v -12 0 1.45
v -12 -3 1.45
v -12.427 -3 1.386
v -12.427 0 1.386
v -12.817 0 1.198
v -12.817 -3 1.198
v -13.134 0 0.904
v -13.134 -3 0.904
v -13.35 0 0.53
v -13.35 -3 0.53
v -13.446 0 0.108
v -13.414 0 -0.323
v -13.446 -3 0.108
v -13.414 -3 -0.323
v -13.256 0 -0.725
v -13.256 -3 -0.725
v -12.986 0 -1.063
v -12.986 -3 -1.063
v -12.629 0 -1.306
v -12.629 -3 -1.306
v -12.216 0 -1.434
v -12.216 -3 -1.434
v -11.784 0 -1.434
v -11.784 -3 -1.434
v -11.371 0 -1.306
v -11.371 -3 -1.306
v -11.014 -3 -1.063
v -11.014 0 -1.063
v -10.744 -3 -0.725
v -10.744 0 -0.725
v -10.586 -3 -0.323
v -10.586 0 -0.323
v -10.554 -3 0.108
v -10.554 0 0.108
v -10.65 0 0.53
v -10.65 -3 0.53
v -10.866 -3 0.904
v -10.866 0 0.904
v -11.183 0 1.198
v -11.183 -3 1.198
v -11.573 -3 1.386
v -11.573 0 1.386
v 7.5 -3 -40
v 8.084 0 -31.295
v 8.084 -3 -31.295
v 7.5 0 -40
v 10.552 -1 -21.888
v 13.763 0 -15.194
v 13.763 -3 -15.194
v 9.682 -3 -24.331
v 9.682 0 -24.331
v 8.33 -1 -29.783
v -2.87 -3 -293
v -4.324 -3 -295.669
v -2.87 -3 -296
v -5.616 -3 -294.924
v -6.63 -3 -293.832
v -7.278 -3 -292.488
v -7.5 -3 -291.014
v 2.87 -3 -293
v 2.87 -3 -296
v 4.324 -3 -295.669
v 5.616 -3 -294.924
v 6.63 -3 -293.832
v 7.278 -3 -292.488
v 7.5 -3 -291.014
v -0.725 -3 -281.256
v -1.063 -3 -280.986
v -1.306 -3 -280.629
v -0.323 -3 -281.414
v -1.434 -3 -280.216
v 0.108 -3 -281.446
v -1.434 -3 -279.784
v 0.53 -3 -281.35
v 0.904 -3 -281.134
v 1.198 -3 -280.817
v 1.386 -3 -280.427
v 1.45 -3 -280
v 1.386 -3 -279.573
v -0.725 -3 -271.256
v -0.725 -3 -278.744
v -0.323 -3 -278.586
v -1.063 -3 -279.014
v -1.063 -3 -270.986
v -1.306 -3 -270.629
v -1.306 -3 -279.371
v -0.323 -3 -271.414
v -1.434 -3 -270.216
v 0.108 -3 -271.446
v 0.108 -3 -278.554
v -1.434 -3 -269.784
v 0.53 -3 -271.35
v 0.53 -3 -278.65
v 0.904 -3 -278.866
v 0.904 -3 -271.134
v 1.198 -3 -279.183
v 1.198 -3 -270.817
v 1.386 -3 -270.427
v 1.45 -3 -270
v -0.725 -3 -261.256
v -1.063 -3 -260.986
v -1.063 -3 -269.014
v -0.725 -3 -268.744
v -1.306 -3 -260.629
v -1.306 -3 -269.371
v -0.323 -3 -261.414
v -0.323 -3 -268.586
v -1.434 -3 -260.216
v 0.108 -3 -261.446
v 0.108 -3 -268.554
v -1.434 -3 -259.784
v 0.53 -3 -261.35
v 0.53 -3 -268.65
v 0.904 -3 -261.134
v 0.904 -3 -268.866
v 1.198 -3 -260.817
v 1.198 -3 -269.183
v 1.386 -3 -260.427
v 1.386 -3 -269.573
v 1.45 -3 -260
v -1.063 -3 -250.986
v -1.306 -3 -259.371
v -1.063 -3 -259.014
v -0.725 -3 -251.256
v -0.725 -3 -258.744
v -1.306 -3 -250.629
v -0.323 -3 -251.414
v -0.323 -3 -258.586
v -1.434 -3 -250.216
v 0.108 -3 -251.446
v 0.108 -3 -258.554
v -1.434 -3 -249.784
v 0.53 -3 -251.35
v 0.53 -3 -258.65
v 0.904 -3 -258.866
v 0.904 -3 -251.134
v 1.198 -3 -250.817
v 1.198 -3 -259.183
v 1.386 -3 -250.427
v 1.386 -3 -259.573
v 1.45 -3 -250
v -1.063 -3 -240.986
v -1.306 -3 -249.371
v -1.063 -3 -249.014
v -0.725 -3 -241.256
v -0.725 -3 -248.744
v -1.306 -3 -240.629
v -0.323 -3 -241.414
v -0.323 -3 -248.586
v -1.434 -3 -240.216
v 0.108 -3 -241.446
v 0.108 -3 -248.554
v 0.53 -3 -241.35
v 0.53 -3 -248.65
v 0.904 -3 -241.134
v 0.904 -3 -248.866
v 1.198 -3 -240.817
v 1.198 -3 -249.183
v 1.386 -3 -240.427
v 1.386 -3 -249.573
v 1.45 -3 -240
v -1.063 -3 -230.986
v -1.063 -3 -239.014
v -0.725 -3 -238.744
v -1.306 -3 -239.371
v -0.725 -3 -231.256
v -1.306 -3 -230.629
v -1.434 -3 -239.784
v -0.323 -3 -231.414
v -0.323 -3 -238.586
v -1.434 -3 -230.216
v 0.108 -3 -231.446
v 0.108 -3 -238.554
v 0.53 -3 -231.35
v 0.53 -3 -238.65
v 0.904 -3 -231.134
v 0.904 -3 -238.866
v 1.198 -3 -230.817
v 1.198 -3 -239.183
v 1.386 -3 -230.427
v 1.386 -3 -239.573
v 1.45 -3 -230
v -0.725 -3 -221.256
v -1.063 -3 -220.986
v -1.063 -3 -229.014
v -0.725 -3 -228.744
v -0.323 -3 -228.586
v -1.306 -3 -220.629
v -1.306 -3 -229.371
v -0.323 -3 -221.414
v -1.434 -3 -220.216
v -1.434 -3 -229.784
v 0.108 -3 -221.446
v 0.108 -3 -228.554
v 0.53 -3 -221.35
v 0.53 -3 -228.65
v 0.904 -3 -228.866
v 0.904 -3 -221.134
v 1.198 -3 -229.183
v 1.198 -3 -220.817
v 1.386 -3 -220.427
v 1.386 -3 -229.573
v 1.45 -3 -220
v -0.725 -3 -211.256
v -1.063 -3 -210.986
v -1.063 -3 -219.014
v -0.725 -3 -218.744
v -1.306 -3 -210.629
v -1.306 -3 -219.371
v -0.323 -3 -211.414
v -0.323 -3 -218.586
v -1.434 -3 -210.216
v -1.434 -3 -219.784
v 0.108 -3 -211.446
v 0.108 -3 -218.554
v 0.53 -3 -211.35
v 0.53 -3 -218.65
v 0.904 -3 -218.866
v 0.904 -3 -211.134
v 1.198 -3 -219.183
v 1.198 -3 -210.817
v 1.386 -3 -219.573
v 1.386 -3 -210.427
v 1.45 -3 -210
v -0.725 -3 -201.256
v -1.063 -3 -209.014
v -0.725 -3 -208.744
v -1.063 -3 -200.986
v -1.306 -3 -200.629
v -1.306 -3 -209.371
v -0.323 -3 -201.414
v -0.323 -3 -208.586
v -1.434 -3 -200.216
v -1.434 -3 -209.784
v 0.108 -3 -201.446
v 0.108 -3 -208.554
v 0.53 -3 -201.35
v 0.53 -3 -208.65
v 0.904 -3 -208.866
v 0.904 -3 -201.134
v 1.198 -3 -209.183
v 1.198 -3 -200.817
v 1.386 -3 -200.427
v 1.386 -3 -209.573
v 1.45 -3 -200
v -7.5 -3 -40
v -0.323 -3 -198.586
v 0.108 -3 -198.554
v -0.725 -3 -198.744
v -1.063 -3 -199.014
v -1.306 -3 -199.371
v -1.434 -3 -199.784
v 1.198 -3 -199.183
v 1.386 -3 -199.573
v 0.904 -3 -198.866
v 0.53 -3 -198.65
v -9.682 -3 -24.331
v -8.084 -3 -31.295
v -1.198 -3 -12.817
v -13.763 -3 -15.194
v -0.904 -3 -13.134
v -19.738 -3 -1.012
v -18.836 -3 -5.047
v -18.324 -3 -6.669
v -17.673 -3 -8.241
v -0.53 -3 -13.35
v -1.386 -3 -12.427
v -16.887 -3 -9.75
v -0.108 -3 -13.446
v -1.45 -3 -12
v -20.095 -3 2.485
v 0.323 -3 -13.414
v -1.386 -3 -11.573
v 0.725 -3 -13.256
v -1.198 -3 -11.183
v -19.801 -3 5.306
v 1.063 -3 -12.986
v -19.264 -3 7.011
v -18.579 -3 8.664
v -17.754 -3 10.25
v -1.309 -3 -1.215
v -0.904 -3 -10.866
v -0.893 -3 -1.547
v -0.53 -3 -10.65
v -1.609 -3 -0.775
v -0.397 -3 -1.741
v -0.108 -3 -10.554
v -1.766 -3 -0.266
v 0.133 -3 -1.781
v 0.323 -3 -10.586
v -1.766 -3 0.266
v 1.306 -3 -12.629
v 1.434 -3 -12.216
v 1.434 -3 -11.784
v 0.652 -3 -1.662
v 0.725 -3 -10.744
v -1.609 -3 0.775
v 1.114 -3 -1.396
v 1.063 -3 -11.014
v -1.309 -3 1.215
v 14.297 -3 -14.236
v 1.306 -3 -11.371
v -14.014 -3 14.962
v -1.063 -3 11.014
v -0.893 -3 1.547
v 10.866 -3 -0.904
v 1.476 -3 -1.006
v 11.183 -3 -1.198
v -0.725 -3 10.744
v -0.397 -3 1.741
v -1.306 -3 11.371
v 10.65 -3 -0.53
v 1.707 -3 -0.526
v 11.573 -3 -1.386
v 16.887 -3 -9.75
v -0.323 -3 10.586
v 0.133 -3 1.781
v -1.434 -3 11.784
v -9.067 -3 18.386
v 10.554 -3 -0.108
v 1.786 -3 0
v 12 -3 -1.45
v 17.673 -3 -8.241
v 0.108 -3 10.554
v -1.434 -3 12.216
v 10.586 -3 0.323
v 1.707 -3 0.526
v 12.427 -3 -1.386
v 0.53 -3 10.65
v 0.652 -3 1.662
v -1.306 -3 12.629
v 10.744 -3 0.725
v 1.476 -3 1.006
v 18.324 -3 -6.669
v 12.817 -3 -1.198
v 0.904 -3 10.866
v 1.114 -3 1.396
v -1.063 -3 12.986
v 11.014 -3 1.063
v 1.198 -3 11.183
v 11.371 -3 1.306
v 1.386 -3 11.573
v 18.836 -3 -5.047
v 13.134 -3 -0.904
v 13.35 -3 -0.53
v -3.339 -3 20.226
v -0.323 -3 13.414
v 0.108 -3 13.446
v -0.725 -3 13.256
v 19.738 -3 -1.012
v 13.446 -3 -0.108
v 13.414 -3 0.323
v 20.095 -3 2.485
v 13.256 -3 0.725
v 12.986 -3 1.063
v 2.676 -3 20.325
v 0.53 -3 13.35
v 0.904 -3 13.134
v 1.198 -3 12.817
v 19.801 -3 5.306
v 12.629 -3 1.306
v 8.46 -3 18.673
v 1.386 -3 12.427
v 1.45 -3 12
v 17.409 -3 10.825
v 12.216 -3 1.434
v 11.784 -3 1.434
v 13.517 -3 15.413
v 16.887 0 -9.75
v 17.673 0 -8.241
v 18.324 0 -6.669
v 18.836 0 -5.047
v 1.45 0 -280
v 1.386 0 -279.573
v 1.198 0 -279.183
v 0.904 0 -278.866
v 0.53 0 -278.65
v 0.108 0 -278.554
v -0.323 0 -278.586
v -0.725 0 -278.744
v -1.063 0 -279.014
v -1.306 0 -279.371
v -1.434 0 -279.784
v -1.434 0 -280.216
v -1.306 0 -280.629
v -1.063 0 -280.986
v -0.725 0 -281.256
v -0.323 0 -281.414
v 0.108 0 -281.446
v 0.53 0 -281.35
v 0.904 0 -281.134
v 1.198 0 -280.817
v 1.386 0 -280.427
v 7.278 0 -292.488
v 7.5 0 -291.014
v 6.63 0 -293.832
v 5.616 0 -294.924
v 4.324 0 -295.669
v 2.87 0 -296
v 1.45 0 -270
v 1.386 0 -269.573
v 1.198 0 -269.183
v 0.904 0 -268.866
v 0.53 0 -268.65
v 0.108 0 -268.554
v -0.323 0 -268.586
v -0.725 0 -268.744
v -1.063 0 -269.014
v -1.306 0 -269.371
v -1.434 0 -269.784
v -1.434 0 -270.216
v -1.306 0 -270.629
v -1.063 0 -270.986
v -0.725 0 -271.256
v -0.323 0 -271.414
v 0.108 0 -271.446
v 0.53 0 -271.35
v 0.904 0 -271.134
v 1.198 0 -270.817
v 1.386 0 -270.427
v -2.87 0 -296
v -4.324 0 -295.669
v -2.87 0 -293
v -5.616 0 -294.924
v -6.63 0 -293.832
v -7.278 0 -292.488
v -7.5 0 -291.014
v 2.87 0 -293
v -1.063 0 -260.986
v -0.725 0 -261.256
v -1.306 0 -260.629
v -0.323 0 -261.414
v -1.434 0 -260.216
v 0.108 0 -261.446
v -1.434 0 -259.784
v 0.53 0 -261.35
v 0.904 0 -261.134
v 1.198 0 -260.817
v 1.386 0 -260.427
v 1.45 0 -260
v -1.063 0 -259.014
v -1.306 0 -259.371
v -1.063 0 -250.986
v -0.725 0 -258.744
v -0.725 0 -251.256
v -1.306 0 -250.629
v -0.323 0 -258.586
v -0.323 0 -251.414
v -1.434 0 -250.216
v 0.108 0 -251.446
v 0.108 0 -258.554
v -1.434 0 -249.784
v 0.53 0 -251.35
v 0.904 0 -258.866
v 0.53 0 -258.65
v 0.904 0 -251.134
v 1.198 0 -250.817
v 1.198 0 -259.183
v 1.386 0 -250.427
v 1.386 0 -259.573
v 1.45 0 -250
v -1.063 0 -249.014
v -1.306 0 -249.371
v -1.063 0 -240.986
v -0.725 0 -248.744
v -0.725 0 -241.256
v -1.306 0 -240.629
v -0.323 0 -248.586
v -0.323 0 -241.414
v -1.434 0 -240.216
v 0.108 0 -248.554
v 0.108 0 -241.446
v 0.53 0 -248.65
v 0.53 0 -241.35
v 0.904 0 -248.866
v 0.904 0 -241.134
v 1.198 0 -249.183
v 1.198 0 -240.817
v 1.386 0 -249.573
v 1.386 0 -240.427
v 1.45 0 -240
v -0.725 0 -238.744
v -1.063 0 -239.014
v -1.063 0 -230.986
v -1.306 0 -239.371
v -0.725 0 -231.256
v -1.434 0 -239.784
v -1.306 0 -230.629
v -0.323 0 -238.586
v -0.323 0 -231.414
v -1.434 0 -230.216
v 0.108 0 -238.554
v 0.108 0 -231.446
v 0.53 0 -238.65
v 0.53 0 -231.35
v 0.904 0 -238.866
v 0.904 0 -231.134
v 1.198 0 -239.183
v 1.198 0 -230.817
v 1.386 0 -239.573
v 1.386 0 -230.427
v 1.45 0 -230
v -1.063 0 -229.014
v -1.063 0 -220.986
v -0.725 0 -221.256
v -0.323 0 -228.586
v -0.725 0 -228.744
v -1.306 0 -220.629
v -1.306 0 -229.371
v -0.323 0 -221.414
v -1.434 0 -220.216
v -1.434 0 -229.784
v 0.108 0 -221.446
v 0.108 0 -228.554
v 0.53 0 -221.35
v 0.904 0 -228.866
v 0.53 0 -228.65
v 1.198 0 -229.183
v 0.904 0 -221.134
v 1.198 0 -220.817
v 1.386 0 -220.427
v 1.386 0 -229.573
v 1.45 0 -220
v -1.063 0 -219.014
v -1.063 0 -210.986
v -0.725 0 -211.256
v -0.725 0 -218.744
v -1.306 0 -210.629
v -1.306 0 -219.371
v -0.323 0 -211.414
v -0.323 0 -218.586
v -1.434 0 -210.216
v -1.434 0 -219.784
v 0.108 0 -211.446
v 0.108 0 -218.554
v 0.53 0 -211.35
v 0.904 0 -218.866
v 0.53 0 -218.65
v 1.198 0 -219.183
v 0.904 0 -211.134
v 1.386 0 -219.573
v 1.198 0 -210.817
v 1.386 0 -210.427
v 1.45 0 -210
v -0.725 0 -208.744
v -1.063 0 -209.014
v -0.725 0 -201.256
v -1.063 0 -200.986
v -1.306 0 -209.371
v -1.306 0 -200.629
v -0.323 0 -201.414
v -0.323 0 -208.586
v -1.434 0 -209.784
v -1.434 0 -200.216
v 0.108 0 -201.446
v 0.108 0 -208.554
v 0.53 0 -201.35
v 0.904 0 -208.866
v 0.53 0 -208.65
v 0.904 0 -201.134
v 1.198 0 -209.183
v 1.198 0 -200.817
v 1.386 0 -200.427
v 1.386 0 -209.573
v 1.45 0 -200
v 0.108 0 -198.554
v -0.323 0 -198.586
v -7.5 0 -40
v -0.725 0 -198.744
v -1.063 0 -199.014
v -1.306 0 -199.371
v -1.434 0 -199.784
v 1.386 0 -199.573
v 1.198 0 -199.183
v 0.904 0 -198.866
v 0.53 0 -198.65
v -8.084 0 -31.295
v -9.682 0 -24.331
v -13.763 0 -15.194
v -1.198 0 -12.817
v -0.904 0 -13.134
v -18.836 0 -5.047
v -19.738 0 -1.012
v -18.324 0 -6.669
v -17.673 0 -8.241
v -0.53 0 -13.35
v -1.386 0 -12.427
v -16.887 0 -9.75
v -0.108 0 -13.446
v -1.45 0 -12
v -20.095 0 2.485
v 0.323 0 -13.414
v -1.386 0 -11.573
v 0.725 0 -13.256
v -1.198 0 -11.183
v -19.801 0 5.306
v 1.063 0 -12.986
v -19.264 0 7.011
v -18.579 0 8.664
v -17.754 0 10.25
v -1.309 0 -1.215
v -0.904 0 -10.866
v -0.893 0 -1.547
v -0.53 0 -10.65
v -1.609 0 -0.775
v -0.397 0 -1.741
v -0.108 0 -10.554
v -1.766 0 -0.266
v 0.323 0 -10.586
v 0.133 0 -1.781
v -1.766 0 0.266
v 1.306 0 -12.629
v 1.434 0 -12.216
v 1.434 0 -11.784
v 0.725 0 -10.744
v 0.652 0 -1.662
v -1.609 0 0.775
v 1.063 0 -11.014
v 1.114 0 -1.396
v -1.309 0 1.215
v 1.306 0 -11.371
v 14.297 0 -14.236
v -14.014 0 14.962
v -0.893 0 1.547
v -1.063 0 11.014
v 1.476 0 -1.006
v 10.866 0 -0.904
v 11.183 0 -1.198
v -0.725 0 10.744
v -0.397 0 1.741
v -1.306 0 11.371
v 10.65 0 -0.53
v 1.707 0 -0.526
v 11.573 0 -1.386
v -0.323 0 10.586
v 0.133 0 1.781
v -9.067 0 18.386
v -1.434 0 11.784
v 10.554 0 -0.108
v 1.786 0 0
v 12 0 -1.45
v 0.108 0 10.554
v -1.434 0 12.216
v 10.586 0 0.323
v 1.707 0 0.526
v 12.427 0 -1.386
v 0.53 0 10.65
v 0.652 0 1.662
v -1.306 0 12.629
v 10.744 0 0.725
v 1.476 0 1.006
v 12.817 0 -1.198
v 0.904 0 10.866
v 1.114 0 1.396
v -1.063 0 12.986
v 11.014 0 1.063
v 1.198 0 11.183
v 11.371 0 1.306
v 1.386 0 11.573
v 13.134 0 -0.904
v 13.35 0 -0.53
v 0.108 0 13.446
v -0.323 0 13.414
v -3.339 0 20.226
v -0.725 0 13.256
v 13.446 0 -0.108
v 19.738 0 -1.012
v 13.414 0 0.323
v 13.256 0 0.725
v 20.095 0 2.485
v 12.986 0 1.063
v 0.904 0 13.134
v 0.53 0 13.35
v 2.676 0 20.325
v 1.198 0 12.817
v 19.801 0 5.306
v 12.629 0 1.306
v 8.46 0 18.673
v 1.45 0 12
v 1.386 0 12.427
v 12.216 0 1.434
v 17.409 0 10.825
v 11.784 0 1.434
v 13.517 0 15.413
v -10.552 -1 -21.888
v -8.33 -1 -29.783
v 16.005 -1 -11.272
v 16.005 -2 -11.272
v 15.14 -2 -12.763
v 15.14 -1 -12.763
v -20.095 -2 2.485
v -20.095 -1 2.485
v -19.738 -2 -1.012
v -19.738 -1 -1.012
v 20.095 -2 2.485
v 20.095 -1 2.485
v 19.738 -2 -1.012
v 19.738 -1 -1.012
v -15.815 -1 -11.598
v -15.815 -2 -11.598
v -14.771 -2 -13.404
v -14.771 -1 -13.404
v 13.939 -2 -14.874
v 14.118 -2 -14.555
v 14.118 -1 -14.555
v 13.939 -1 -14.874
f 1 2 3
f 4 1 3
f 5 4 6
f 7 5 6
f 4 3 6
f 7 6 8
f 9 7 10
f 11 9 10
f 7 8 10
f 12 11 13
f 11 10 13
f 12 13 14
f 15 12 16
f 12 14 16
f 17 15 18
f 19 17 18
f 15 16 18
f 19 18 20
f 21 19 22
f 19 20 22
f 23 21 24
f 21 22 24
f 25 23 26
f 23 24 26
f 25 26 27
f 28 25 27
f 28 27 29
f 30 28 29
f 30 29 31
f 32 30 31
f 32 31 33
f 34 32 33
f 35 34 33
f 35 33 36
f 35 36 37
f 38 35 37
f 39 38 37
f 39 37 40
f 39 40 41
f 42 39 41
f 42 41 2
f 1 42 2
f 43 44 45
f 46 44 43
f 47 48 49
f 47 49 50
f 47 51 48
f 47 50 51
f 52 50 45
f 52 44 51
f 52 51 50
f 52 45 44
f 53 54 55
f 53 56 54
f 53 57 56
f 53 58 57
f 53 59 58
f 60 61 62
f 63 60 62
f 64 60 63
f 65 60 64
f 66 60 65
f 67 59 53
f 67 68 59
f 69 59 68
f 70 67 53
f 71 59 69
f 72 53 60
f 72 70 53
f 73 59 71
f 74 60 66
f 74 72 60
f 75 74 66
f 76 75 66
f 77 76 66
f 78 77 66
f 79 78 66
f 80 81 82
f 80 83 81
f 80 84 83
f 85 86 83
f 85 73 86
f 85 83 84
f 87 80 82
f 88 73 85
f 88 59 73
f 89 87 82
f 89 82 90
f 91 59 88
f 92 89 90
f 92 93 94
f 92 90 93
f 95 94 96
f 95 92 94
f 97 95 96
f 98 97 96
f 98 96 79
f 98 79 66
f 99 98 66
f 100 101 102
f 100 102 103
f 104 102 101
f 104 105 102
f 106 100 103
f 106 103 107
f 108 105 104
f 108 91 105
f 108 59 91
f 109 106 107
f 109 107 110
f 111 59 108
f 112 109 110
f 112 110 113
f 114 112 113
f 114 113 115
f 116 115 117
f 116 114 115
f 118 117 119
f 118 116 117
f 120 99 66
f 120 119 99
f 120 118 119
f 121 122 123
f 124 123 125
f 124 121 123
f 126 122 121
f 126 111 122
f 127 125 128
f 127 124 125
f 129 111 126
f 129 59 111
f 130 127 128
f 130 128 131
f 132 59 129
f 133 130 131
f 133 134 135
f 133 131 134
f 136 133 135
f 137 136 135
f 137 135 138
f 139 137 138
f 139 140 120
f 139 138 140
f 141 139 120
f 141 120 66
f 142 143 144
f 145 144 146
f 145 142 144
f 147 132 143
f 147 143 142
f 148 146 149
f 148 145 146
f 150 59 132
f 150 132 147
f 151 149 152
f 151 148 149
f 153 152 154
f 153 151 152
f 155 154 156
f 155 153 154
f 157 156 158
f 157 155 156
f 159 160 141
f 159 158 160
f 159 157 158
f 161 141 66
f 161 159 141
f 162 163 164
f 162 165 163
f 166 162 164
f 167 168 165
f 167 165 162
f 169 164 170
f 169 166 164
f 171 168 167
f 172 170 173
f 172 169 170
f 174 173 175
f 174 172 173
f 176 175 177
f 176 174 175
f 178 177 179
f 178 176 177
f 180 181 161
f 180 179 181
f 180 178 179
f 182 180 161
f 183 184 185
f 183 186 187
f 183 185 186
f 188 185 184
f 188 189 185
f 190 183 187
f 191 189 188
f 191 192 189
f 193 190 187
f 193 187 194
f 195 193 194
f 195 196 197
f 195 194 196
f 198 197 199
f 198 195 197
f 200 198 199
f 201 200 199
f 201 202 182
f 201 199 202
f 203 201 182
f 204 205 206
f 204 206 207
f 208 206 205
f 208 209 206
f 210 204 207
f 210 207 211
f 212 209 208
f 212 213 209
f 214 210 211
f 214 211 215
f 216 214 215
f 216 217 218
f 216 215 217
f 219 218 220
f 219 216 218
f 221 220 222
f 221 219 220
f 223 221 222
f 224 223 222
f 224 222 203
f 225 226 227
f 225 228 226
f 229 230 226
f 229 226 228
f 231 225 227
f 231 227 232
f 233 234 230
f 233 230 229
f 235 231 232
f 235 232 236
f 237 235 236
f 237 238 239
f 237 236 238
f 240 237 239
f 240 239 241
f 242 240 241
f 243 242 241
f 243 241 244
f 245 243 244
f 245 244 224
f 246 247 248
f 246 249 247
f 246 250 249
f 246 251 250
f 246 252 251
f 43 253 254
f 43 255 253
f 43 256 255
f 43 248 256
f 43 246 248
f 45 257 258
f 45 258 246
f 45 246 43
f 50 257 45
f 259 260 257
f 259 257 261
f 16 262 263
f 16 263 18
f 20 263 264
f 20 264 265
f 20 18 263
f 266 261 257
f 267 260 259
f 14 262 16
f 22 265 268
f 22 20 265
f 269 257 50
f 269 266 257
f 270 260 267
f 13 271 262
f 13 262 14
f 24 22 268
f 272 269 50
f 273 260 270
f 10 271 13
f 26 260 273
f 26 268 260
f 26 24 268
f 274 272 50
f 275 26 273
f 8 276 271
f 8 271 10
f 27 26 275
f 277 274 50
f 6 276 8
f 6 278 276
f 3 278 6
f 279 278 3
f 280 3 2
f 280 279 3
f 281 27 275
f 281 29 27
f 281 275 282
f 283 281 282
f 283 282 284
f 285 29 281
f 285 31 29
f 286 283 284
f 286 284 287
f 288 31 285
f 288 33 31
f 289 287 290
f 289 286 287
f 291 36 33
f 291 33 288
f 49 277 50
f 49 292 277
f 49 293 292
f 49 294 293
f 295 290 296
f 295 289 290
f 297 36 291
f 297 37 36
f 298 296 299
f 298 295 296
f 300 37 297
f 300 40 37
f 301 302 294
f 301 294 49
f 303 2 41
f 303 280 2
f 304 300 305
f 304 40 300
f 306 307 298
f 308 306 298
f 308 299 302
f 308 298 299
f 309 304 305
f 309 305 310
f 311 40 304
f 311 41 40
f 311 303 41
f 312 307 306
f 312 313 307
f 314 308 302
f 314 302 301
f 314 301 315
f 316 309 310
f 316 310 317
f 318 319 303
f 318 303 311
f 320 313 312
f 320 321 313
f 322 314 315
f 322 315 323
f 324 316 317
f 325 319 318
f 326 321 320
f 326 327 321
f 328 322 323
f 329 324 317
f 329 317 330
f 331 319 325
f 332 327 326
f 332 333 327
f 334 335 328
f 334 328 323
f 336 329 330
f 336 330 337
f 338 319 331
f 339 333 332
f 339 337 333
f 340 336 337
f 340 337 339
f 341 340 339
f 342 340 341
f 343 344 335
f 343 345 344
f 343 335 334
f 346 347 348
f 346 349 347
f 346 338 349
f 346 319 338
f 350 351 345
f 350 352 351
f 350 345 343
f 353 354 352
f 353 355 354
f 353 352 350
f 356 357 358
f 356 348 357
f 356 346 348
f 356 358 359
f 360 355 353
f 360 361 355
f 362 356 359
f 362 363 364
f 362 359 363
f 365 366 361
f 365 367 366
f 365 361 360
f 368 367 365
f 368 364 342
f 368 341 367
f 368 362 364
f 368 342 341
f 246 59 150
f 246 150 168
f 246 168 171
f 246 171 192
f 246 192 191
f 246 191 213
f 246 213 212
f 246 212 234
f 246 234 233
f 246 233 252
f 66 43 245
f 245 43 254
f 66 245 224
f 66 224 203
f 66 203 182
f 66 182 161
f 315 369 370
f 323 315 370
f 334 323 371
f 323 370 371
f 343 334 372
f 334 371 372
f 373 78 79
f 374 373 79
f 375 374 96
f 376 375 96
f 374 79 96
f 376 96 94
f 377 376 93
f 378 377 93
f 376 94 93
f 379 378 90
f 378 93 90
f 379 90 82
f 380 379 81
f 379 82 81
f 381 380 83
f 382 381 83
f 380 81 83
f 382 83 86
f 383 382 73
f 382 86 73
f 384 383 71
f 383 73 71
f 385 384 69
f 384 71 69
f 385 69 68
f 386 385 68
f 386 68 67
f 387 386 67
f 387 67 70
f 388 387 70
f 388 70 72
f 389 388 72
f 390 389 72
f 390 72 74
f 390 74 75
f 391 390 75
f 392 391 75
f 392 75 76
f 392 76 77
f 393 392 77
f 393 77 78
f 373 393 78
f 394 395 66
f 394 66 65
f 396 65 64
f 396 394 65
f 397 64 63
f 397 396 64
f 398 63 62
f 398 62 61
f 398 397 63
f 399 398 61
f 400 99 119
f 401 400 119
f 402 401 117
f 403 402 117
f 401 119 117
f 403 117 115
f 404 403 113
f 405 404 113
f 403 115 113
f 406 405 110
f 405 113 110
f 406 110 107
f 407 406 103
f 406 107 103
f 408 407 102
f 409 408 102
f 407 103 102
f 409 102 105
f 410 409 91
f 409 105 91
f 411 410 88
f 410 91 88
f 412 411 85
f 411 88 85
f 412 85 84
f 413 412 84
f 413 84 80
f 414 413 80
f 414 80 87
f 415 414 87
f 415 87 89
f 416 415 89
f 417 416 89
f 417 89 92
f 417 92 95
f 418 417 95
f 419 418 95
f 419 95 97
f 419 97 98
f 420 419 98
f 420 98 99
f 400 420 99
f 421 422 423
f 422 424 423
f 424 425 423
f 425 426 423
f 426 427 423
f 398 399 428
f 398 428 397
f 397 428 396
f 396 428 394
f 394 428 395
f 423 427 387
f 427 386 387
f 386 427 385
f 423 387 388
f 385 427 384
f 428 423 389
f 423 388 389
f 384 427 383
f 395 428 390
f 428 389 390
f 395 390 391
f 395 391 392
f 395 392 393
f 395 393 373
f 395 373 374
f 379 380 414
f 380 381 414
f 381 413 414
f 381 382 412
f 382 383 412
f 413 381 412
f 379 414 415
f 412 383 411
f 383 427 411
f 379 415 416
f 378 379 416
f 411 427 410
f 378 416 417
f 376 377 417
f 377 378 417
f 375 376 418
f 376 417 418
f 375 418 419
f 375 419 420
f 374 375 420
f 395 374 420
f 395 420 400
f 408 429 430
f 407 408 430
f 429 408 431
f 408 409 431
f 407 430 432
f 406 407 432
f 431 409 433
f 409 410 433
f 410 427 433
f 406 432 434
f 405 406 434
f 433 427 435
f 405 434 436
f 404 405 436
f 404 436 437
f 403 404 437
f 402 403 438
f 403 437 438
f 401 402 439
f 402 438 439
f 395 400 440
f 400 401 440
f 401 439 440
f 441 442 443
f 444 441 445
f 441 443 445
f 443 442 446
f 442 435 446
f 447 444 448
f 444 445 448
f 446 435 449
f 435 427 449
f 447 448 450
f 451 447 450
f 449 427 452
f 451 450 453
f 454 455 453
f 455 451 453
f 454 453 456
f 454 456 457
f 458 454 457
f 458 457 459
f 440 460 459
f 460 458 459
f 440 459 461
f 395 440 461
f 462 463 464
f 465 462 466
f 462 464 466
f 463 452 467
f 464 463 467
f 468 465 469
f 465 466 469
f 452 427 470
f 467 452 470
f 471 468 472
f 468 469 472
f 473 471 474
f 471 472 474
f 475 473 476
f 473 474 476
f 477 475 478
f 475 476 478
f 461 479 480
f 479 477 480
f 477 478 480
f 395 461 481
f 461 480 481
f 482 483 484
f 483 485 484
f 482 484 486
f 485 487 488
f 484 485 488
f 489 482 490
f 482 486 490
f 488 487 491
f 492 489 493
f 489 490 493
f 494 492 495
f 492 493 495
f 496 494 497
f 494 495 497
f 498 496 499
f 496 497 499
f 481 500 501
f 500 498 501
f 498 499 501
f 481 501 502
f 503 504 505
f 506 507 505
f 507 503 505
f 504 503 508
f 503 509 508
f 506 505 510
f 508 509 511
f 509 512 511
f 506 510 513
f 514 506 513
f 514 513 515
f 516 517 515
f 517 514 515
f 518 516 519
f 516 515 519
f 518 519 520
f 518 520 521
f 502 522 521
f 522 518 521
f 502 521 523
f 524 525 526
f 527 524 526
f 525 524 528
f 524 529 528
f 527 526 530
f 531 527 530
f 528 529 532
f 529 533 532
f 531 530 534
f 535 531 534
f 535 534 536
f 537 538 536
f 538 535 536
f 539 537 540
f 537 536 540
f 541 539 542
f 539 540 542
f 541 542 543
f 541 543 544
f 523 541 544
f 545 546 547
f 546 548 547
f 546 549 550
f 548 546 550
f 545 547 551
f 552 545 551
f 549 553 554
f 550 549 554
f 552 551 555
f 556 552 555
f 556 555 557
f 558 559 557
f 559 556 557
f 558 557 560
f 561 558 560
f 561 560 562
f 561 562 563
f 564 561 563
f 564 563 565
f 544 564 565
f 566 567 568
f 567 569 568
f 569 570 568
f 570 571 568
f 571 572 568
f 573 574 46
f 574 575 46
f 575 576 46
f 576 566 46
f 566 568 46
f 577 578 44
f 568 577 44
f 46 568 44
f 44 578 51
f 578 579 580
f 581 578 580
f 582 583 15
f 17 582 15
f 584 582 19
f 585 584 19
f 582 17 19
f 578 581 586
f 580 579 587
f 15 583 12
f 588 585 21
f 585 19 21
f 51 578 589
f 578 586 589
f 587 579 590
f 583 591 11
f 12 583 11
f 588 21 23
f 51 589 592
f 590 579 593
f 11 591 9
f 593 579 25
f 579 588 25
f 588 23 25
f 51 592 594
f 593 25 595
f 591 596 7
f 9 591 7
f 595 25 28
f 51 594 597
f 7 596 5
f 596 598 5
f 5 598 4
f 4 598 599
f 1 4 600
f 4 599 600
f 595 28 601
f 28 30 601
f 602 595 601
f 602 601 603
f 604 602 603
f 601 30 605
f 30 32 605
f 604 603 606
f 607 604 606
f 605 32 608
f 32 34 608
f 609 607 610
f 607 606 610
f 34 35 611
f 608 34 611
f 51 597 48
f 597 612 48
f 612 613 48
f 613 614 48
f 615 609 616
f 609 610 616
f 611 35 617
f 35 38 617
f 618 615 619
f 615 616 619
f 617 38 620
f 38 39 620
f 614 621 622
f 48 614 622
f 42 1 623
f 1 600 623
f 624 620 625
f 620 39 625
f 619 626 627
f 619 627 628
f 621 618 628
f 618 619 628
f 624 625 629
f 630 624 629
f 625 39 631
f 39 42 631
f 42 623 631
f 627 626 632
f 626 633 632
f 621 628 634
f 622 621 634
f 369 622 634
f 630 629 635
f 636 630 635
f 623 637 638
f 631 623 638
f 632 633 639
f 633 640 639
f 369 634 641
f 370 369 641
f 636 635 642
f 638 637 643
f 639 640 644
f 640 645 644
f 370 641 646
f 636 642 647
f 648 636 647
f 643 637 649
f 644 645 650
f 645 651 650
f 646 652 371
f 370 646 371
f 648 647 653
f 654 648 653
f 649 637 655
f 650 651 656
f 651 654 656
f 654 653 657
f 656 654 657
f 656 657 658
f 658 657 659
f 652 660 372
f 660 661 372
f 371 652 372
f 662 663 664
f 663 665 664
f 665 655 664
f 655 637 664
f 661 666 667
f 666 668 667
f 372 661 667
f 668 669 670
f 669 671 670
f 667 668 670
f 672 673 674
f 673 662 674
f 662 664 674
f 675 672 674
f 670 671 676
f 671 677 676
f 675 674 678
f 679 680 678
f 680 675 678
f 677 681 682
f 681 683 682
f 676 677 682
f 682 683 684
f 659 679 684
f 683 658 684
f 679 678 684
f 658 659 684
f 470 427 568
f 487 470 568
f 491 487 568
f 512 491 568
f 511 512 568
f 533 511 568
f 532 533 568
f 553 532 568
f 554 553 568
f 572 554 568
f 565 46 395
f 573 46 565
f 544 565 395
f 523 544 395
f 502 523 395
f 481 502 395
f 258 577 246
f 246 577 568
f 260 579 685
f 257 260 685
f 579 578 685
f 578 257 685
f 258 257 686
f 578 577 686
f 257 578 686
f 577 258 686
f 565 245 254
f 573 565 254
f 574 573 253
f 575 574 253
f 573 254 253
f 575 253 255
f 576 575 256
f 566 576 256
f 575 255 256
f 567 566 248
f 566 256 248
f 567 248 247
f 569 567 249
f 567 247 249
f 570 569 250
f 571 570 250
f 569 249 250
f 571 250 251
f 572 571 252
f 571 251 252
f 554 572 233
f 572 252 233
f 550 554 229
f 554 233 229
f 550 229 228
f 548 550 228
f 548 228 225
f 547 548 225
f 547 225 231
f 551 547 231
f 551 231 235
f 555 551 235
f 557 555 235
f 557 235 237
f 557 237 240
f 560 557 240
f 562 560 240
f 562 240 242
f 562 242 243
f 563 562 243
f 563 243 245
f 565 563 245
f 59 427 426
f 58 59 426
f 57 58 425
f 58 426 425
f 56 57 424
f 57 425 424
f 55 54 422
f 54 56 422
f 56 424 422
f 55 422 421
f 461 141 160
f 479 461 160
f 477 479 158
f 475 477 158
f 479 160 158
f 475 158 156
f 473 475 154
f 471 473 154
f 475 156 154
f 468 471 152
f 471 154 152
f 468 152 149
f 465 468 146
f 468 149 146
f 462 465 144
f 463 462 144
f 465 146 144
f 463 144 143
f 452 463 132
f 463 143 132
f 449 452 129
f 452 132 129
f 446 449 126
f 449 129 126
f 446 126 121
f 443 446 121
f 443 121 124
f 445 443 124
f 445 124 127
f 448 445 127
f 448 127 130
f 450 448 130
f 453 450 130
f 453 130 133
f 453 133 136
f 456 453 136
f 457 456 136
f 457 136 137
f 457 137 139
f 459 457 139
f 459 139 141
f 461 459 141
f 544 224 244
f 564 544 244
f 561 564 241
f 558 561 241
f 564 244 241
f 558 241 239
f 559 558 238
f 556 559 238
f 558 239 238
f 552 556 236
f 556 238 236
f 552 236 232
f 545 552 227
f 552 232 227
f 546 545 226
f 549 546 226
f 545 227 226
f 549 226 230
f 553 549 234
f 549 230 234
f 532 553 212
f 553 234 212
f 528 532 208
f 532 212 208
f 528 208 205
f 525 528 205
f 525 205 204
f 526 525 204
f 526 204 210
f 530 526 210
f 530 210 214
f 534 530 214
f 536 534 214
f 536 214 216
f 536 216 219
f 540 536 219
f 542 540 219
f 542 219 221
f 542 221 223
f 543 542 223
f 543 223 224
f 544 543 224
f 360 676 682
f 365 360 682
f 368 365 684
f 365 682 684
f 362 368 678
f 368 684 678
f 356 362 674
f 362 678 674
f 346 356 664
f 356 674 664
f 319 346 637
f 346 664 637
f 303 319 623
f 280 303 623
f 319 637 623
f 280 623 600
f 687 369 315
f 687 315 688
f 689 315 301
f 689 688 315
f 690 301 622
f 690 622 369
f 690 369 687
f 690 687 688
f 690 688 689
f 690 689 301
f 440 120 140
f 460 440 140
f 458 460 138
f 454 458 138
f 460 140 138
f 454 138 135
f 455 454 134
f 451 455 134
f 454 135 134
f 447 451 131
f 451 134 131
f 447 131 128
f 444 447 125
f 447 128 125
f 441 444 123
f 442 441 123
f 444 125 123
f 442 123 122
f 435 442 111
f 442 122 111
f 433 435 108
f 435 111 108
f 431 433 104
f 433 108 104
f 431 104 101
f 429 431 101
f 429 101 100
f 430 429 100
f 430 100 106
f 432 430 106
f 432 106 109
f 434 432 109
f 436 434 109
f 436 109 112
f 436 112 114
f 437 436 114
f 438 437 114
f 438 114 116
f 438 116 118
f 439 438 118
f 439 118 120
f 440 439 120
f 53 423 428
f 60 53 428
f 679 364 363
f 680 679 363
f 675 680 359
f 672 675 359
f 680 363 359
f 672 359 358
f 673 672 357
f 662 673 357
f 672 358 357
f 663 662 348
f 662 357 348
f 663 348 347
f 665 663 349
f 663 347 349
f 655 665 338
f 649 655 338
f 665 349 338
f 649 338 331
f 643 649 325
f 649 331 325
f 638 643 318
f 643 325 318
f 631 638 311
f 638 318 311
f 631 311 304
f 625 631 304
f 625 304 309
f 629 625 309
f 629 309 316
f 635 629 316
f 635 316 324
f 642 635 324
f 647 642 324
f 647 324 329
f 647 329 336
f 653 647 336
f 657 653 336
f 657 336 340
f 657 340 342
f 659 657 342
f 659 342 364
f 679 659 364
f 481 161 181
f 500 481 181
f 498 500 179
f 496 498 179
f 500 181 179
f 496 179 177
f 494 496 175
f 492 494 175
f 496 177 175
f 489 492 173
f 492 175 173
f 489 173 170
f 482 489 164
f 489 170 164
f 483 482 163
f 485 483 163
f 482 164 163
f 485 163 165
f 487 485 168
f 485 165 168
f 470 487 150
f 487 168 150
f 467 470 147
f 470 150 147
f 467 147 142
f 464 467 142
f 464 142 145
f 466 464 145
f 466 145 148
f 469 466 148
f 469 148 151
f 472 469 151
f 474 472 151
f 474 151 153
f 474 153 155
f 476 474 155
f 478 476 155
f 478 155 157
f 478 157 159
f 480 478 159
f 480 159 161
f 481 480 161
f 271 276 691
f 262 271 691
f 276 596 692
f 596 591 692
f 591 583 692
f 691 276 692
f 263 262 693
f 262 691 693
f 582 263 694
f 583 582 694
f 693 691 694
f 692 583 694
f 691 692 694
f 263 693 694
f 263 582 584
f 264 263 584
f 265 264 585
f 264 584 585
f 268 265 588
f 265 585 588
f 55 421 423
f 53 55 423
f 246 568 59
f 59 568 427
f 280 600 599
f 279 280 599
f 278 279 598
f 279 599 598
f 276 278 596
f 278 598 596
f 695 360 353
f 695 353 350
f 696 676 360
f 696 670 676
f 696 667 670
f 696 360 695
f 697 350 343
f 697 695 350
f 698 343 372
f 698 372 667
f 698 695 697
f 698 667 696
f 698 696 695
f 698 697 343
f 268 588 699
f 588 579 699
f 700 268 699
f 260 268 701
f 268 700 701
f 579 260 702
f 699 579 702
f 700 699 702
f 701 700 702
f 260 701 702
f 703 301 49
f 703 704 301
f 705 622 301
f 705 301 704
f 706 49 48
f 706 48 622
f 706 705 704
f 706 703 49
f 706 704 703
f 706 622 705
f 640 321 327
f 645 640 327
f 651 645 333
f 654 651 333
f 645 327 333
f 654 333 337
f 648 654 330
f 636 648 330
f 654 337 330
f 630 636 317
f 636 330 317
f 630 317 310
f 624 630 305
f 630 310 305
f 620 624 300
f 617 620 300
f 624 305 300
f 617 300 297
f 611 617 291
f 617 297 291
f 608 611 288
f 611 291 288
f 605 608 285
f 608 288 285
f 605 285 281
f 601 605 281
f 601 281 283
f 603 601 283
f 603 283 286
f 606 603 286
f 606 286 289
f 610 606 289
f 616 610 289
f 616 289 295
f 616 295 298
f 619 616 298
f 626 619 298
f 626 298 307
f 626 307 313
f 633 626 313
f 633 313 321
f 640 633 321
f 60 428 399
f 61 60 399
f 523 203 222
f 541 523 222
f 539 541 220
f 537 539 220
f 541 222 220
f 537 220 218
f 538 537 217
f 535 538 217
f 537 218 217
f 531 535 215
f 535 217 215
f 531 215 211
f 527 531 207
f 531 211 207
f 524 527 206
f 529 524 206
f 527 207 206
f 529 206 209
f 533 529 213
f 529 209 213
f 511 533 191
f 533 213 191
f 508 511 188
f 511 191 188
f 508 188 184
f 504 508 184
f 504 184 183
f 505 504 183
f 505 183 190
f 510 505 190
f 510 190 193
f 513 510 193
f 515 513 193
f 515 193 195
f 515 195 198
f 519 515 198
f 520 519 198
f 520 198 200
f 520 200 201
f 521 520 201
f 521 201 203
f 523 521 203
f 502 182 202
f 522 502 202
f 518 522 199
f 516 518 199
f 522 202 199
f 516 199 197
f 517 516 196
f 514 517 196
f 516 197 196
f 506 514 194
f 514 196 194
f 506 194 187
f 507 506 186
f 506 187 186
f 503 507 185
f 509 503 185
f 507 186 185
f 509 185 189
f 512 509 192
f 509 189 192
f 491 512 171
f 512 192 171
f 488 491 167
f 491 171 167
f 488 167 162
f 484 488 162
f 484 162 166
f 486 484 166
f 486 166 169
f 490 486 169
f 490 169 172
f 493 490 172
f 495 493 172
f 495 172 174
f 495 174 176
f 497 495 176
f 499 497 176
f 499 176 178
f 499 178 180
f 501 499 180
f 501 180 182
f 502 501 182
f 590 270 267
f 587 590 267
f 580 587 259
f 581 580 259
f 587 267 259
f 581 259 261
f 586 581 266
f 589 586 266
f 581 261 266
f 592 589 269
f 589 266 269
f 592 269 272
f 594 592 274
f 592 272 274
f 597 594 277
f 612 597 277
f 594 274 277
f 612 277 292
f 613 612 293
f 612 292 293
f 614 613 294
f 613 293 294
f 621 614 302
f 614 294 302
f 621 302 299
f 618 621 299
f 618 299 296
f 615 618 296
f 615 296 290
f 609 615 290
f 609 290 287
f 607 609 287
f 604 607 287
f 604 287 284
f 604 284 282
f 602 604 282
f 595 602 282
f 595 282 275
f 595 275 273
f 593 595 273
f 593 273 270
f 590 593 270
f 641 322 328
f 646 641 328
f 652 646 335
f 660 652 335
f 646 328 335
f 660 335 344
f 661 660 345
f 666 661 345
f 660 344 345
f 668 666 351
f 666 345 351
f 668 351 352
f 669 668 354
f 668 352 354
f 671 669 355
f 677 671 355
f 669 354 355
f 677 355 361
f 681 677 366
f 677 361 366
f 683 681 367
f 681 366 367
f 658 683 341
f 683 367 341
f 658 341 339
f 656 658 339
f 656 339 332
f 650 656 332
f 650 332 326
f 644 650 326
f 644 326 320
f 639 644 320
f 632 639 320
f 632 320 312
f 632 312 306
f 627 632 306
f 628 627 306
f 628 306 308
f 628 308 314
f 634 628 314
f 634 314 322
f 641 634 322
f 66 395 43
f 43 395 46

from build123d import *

# Parameters (mm, degrees)
F1_DEPTH        = 3
F2_R            = 1.7859375
F3_DEPTH        = 25
F4_T1_DEPTH     = 27.9314560345
F6_R            = 1.45
F7_DEPTH        = 25
F7_COPIES_COUNT = 4
F8_R            = 1.45
F9_DEPTH        = 25


# Not quite as in the source:
# - a fillet or chamfer that OpenCascade refuses, or shapes differently, is made with other operations: its cross-section is extruded or revolved along the edge and cut away or added
# - a pattern or mirror of a feature is missing from the dataset's text; its kind, count and spacing are read off the source's solid


with BuildPart() as f1:
    # F0 (on Front) → F1 (new body)
    with BuildSketch(Plane.XZ):
        with BuildLine():
            ThreePointArc((-17.7535207776, 10.25), (-18.9395304165, 7.8450103635), (-19.8014794389, 5.3057904246))
            add(Edge.make_bspline(
                [(-19.8014794389, 5.3057904246), (-20.454122155, 2.8700946489), (-19.9763700286, -0.7893865531), (-18.8355536126, -5.0469713795)],
                knots=[0, 0, 0, 0, 10.3977252163, 10.3977252163, 10.3977252163, 10.3977252163], degree=3))
            ThreePointArc((-18.8355536126, -5.0469713795), (-19.3331747968, 2.5452607483), (-16.8874953738, 9.75))
            Line((-16.8874953738, 9.75), (-17.7535207776, 10.25))
        make_face()
        with BuildLine():
            add(Edge.make_bspline(
                [(19.8014794389, 5.3057904246), (20.454122155, 2.8700946489), (19.9763700286, -0.7893865531), (18.8355536126, -5.0469713795)],
                knots=[0, 0, 0, 0, 10.3977252163, 10.3977252163, 10.3977252163, 10.3977252163], degree=3))
            ThreePointArc((19.8014794389, 5.3057904246), (2.6757869405, 20.3246196582), (-17.7535207776, 10.25))
            Line((-17.7535207776, 10.25), (-16.8874953738, 9.75))
            ThreePointArc((-16.8874953738, 9.75), (5.0469713795, 18.8355536126), (19.5, 0))
            ThreePointArc((19.5, 0), (19.3331747968, -2.5452607483), (18.8355536126, -5.0469713795))
        make_face()
        with BuildLine():
            ThreePointArc((-18.8355536126, -5.0469713795), (-18.015650884, -7.4623269311), (-16.8874953738, -9.75))
            ThreePointArc((-16.8874953738, -9.75), (0, -19.5), (16.8874953738, -9.75))
            ThreePointArc((16.8874953738, -9.75), (18.015650884, -7.4623269311), (18.8355536126, -5.0469713795))
            ThreePointArc((18.8355536126, -5.0469713795), (19.3331747968, -2.5452607483), (19.5, 0))
            ThreePointArc((19.5, 0), (5.0469713795, 18.8355536126), (-16.8874953738, 9.75))
            ThreePointArc((-16.8874953738, 9.75), (-19.3331747968, 2.5452607483), (-18.8355536126, -5.0469713795))
        make_face()
        with BuildLine():
            add(Edge.make_bspline(
                [(-16.8874953738, -9.75), (-15.8042909868, -11.6261650333), (-14.7498334446, -13.4051543525), (-13.7625055876, -15.1935328331)],
                knots=[0, 0, 0, 0, 6.8616960598, 6.8616960598, 6.8616960598, 6.8616960598], degree=3))
            ThreePointArc((-13.7625055876, -15.1935328331), (-0.0251276064, -20.4999846001), (13.7252177136, -15.2272255751))
            Line((13.7252177136, -15.2272255751), (14.297471583, -14.2360527984))
            add(Edge.make_bspline(
                [(16.8874953738, -9.75), (15.997662101, -11.2912364387), (15.1272281545, -12.7668954762), (14.297471583, -14.2360527984)],
                knots=[0, 0, 0, 0, 5.6367621242, 5.6367621242, 5.6367621242, 5.6367621242], degree=3))
            ThreePointArc((16.8874953738, -9.75), (0, -19.5), (-16.8874953738, -9.75))
        make_face()
        with BuildLine():
            Line((-7.5, -40), (7.5, -40))
            add(Edge.make_bspline(
                [(13.7625055876, -15.1935328331), (10.192393183, -21.6601914536), (7.5, -28.2496131611), (7.5, -40)],
                knots=[6.8616960598, 6.8616960598, 6.8616960598, 6.8616960598, 31.6731363997, 31.6731363997, 31.6731363997, 31.6731363997], degree=3))
            ThreePointArc((13.7625055876, -15.1935328331), (13.7438719752, -15.2103906304), (13.7252177136, -15.2272255751))
            ThreePointArc((13.7252177136, -15.2272255751), (-0.0251276064, -20.4999846001), (-13.7625055876, -15.1935328331))
            add(Edge.make_bspline(
                [(-13.7625055876, -15.1935328331), (-10.192393183, -21.6601914536), (-7.5, -28.2496131611), (-7.5, -40)],
                knots=[6.8616960598, 6.8616960598, 6.8616960598, 6.8616960598, 31.6731363997, 31.6731363997, 31.6731363997, 31.6731363997], degree=3))
        make_face()
        with BuildLine():
            ThreePointArc((13.7252177136, -15.2272255751), (13.7438719752, -15.2103906304), (13.7625055876, -15.1935328331))
            add(Edge.make_bspline(
                [(14.297471583, -14.2360527984), (14.1171558343, -14.5553177631), (13.9387610479, -14.8742756886), (13.7625055876, -15.1935328331)],
                knots=[5.6367621242, 5.6367621242, 5.6367621242, 5.6367621242, 6.8616960598, 6.8616960598, 6.8616960598, 6.8616960598], degree=3))
            Line((14.297471583, -14.2360527984), (13.7252177136, -15.2272255751))
        make_face()
        Polygon((7.5, -296), (7.5, -40), (-7.5, -40), (-7.5, -296), (-2.87, -296), (-2.87, -293), (2.87, -293), (2.87, -296), align=None)
    extrude(amount=F1_DEPTH)

    # F2 (on face) → F3 (cut)
    with BuildSketch(Plane.XZ.offset(3)):
        Circle(F2_R)
    extrude(amount=-F3_DEPTH, mode=Mode.SUBTRACT)

    # F4: fillet of radius 5 on 2 edges, made by hand

    # F4_s2 → F4_t1 (cut)
    with BuildSketch(Plane.XZ.offset(-12.4657280172)):
        with BuildLine():
            ThreePointArc((-7.5, -291.0137087931), (-6.1640141921, -294.4159139603), (-2.87, -296))
            Line((-2.87, -296), (-7.5, -296))
            Line((-7.5, -296), (-7.5, -291.0137087931))
        make_face()
        with BuildLine():
            ThreePointArc((7.5, -291.0137087931), (6.1640141921, -294.4159139603), (2.87, -296))
            Line((2.87, -296), (7.5, -296))
            Line((7.5, -296), (7.5, -291.0137087931))
        make_face()
    extrude(amount=F4_T1_DEPTH, mode=Mode.SUBTRACT)

    # F6 (on face) → F7 (cut)
    with BuildSketch(Plane.XZ.offset(3)):
        with Locations((0, 12)):
            Circle(F6_R)
    f7 = extrude(amount=-F7_DEPTH, mode=Mode.SUBTRACT)

    # F7_copies: F7 ×4 about axis
    f7_copies_axis = Axis((0, 0, 0), (0, 1, 0))
    for i in range(1, F7_COPIES_COUNT):
        add(f7.rotate(f7_copies_axis, i * 360 / F7_COPIES_COUNT), mode=Mode.SUBTRACT)

    # F8 (on face) → F9 (cut)
    with BuildSketch(Plane.XZ.offset(3)):
        with Locations((0, -200)):
            Circle(F8_R)
        with Locations((0, -210)):
            Circle(F8_R)
        with Locations((0, -220)):
            Circle(F8_R)
        with Locations((0, -230)):
            Circle(F8_R)
        with Locations((0, -240)):
            Circle(F8_R)
        with Locations((0, -250)):
            Circle(F8_R)
        with Locations((0, -260)):
            Circle(F8_R)
        with Locations((0, -270)):
            Circle(F8_R)
        with Locations((0, -280)):
            Circle(F8_R)
    extrude(amount=-F9_DEPTH, mode=Mode.SUBTRACT)


solid = f1.part
